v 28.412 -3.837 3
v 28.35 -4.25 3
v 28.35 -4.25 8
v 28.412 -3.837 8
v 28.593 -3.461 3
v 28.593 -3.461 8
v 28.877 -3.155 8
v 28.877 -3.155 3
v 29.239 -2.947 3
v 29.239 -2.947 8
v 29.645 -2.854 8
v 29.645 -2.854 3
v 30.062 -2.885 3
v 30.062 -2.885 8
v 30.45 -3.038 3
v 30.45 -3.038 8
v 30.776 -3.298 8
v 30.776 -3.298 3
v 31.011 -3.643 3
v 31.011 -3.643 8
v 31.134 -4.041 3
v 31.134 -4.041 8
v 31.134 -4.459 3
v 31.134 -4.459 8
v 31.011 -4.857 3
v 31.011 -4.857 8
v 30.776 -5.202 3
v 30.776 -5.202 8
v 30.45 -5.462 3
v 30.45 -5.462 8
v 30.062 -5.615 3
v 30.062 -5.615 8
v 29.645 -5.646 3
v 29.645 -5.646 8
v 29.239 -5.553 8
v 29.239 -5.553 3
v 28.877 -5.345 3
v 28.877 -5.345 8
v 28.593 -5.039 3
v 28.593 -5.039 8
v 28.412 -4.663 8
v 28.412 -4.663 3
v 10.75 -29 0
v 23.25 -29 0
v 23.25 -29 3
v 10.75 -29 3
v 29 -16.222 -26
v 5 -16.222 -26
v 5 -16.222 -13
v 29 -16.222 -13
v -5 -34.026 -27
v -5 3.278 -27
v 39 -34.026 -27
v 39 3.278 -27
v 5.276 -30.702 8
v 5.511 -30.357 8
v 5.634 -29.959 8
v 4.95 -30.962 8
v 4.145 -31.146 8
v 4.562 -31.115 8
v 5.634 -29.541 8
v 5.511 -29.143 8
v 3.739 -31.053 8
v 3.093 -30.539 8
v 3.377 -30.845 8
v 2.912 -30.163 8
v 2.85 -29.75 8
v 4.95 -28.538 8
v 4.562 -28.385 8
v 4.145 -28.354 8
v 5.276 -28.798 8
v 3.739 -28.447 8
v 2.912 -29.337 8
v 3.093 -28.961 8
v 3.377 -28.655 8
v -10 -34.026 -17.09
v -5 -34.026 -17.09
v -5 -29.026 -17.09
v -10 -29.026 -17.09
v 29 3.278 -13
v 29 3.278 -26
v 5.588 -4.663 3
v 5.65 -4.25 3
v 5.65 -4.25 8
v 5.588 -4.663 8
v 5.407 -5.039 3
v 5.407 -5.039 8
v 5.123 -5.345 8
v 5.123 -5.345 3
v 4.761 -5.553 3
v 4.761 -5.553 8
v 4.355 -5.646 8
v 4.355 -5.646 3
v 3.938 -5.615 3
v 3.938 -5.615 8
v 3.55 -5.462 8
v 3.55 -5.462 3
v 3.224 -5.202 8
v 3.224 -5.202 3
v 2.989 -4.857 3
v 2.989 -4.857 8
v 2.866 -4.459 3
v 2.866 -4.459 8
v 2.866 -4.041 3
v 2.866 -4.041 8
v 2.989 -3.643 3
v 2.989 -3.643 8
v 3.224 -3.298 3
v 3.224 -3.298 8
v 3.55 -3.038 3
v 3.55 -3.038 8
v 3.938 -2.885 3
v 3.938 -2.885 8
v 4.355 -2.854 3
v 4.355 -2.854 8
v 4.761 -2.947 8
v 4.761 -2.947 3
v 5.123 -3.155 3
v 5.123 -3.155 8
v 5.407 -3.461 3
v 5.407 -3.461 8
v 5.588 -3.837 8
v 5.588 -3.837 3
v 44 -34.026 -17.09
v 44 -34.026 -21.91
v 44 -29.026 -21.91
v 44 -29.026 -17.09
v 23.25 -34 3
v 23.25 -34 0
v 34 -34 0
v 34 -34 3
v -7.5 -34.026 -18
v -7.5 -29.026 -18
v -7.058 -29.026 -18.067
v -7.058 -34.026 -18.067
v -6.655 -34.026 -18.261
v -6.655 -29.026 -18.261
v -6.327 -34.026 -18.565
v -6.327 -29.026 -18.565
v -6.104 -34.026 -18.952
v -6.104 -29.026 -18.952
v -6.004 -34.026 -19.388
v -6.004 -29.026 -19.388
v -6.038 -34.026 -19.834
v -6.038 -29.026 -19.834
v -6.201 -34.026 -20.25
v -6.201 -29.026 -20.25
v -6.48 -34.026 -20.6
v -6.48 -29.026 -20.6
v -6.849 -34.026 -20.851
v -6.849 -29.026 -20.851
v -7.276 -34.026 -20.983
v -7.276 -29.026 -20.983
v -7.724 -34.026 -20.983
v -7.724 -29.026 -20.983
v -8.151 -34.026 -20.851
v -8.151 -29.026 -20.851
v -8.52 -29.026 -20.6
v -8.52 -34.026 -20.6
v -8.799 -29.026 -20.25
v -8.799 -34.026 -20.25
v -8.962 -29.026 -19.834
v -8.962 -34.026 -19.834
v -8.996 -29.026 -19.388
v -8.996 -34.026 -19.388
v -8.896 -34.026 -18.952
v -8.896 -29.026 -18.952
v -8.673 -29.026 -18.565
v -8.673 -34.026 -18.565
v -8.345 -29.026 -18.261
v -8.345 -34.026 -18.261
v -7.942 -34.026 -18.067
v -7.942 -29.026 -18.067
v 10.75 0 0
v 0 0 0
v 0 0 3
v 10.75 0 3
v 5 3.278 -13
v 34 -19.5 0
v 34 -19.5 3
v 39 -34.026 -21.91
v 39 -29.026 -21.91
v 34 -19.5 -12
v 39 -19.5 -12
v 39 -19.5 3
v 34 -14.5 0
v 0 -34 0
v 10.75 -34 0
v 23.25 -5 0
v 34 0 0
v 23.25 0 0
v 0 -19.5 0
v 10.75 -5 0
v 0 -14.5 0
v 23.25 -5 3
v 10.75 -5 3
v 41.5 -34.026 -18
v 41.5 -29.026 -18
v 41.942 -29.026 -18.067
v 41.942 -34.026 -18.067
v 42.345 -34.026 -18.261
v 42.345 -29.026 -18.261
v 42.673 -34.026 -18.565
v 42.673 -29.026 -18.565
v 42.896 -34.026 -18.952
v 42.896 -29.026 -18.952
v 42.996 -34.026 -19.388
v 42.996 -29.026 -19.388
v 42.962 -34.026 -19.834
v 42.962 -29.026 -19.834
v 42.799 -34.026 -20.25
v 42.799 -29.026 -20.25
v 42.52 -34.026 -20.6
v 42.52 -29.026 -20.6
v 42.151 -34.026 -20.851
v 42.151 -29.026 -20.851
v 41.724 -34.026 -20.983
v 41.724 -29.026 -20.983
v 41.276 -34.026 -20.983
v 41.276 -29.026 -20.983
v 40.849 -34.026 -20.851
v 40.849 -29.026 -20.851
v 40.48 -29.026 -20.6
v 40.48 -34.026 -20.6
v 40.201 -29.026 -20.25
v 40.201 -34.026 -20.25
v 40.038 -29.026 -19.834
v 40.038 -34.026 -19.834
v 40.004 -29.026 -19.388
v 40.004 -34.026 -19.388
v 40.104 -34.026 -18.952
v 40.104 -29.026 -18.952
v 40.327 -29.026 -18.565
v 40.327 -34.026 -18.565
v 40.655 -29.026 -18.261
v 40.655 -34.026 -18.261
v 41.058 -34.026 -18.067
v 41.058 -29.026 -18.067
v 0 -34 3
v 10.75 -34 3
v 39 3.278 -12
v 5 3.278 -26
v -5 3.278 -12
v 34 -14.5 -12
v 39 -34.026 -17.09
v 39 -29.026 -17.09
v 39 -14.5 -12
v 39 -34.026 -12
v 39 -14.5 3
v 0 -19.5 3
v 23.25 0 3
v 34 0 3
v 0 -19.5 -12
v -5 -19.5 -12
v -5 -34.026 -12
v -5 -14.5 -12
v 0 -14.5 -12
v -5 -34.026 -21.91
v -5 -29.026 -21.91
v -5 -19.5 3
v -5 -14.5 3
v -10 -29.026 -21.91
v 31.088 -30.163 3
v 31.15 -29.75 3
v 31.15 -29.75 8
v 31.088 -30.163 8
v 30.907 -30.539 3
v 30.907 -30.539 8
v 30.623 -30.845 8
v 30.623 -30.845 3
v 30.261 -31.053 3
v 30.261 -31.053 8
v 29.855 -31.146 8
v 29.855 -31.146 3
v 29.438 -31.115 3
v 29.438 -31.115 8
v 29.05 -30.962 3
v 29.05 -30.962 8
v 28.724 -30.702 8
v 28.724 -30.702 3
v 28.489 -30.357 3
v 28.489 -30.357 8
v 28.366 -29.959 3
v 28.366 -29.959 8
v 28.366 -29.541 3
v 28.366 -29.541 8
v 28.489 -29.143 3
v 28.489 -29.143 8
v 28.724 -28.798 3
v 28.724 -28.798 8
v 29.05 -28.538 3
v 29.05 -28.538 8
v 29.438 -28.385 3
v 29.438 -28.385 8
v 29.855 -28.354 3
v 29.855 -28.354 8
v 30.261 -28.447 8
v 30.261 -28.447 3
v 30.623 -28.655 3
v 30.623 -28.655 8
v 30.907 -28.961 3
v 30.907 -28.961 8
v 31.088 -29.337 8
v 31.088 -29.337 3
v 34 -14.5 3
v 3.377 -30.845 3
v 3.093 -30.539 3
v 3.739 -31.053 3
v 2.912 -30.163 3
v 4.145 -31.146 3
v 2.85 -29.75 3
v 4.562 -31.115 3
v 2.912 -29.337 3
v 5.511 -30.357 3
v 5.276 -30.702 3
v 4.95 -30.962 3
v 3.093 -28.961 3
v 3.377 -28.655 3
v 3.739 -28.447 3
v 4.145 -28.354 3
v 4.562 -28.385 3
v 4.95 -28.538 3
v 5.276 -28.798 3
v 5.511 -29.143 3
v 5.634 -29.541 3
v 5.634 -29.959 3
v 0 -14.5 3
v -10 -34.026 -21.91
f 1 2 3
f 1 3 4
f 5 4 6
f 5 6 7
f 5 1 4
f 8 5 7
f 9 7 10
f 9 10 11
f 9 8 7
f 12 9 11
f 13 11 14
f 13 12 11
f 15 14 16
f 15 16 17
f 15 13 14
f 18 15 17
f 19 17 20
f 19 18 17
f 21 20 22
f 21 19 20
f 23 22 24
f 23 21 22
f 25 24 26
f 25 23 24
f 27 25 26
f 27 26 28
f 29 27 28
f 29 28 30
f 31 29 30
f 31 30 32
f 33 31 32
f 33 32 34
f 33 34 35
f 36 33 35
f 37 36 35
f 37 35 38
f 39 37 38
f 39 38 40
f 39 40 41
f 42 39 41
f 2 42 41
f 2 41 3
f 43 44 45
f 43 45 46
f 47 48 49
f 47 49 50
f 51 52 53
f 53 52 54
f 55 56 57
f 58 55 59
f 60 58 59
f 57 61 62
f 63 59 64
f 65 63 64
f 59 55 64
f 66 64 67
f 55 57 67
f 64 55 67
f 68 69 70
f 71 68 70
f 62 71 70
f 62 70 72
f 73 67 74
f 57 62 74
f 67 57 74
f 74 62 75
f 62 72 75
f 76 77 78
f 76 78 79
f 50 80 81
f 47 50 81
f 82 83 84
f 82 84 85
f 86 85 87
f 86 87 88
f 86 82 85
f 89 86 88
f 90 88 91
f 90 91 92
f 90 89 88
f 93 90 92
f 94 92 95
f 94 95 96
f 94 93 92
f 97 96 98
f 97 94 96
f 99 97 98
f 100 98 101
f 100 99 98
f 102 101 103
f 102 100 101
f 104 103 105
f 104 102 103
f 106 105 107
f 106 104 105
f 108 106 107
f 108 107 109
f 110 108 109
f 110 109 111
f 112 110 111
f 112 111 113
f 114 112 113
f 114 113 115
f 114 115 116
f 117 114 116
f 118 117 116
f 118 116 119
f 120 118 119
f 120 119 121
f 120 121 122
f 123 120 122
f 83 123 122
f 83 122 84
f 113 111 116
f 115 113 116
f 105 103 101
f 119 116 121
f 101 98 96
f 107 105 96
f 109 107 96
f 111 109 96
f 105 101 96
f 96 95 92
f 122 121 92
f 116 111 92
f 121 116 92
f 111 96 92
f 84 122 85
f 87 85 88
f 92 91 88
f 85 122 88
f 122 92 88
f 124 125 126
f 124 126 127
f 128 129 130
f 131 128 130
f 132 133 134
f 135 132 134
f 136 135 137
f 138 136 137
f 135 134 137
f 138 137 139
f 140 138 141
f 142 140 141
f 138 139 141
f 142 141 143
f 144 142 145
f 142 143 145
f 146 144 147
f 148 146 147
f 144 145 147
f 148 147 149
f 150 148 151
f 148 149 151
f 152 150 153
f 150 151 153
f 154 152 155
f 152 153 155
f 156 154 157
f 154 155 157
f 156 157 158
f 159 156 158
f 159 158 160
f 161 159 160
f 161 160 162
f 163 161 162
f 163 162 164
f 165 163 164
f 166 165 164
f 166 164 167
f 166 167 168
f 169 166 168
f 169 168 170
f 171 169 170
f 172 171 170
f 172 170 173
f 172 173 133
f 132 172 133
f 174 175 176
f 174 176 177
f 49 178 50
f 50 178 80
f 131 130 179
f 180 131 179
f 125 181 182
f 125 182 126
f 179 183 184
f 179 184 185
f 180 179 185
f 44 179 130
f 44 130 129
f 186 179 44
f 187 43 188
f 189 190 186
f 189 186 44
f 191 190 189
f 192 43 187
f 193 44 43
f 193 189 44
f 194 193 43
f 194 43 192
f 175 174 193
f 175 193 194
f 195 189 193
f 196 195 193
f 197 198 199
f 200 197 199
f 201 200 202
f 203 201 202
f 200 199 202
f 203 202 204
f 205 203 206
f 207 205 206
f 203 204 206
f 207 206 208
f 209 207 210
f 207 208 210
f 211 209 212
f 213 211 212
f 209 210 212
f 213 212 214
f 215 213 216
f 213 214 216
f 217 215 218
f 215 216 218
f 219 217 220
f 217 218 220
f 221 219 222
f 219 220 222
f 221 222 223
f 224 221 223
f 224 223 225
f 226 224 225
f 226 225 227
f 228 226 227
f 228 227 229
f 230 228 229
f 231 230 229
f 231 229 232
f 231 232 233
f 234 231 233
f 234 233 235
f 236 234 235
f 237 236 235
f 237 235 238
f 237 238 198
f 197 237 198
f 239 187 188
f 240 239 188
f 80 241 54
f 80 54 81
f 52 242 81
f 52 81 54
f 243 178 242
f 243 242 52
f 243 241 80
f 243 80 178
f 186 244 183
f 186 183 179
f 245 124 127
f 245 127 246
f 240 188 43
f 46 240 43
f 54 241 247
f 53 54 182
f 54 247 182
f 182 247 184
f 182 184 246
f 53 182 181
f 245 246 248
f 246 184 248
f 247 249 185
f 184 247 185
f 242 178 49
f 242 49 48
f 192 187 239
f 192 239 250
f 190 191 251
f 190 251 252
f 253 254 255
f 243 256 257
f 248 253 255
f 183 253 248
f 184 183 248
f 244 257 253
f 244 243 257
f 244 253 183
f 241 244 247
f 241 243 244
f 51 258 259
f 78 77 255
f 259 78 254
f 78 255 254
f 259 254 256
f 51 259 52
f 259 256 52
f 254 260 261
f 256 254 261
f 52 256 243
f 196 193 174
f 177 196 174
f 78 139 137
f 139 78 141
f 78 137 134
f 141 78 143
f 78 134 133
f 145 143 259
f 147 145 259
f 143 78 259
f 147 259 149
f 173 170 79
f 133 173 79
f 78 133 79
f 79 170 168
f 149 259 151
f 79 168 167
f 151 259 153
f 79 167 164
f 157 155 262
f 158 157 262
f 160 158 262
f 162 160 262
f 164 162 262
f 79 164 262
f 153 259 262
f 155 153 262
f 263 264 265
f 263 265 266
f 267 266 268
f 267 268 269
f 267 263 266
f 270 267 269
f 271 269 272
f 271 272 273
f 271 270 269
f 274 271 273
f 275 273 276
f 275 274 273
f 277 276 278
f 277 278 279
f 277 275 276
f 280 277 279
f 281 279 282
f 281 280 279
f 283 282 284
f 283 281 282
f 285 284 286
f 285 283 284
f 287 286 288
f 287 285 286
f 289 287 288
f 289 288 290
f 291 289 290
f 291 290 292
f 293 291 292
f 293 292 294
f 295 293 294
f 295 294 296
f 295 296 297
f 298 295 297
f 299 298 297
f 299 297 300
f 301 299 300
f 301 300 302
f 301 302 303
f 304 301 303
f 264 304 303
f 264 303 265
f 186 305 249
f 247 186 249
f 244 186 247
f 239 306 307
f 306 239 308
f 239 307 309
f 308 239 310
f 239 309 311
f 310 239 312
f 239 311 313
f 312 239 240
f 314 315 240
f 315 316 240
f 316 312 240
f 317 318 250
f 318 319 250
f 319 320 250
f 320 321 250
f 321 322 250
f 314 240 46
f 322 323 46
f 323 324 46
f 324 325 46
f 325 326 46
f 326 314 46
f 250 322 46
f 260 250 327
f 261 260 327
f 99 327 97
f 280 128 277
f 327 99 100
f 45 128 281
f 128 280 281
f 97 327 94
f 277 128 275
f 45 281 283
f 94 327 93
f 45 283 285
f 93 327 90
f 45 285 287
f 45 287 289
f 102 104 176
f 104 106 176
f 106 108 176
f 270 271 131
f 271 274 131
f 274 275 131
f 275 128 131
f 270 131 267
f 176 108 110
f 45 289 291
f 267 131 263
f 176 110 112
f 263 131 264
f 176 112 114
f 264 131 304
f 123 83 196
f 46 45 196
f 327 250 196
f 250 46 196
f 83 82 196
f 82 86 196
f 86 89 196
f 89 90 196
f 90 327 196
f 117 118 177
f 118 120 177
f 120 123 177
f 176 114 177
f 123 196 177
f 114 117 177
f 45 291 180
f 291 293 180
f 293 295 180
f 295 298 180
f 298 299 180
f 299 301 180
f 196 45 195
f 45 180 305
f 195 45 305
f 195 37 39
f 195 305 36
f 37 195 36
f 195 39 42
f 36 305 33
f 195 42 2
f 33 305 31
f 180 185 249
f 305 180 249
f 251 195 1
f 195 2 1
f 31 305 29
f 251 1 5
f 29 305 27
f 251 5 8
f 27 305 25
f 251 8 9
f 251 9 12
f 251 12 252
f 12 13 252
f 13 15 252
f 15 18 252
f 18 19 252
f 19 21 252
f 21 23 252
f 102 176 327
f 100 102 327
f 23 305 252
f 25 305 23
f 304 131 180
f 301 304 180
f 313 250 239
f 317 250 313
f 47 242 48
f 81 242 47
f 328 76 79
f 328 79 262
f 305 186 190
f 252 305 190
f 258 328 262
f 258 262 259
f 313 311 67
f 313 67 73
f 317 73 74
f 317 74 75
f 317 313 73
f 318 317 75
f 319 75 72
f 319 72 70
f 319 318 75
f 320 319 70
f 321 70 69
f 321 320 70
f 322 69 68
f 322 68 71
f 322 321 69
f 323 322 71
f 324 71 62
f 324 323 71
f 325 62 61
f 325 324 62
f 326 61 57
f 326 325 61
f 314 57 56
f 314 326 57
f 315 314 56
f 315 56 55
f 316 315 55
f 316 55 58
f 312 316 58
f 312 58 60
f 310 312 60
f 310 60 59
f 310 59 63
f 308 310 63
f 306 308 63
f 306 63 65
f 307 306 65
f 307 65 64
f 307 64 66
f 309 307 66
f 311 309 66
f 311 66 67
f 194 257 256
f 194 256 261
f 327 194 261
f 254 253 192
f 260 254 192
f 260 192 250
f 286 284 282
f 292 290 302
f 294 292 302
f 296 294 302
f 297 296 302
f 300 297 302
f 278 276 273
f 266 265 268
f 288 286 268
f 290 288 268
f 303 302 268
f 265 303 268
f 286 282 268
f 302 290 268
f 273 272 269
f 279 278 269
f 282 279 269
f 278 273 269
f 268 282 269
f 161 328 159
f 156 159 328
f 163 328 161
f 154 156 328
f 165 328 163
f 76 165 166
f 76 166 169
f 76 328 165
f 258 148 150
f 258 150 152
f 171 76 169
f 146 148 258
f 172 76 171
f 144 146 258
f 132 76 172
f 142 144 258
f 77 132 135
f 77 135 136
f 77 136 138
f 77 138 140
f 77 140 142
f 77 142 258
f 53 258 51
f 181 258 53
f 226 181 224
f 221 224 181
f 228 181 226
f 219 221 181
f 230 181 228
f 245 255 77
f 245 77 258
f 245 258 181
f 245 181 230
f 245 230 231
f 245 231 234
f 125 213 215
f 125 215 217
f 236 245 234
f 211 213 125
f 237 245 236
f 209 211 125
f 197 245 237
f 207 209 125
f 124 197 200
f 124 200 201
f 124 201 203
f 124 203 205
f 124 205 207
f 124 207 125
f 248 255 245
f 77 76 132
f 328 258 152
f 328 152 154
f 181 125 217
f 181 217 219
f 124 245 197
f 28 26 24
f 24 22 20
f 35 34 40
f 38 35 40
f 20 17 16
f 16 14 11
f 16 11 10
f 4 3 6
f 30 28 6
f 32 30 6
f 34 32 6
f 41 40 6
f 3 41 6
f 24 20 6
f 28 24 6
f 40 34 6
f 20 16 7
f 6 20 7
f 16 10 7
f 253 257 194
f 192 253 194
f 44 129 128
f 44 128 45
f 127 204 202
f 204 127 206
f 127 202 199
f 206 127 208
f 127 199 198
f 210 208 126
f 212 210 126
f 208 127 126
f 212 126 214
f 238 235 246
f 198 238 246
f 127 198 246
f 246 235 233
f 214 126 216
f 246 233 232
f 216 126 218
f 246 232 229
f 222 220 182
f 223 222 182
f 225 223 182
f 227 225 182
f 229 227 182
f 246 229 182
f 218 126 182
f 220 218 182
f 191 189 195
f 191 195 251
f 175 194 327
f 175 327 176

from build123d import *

# Parameters (mm, degrees)
SKETCH1_W           = 34
SKETCH1_H           = 34
BOSS_EXTRUDE1_DEPTH = 3
SKETCH2_W           = 12.5
SKETCH2_H           = 5
CUT_EXTRUDE1_DEPTH  = 49.176757882
BOSS_EXTRUDE2_DEPTH = 5
SKETCH3_R           = 1.4
BOSS_EXTRUDE3_DEPTH = 8
SKETCH33_W          = 15
SKETCH33_H          = 5
BOSS_EXTRUDE4_DEPTH = 5
BOSS_EXTRUDE6_DEPTH = 15
SKETCH36_W          = 24
SKETCH36_H          = 13
CUT_EXTRUDE2_DEPTH  = 19.5
BOSS_EXTRUDE7_DEPTH = 5
SKETCH39_R          = 1.5
CUT_EXTRUDE3_DEPTH  = 61.897668661


with BuildPart() as part:
    # Sketch1 → Boss-Extrude1 (new body)
    with BuildSketch(Plane.XY):
        with Locations((17, -17)):
            Rectangle(SKETCH1_W, SKETCH1_H)
    extrude(amount=BOSS_EXTRUDE1_DEPTH)

    # Sketch2 → Cut-Extrude1 (cut, through all)
    with BuildSketch(Plane(origin=(0, 0, 0), x_dir=(-1, 0, 0), z_dir=(0, 0, -1))):
        with Locations((-17, -2.5)):
            Rectangle(SKETCH2_W, SKETCH2_H)
        with Locations((-17, -31.5)):
            Rectangle(SKETCH2_W, SKETCH2_H)
    extrude(amount=-CUT_EXTRUDE1_DEPTH, mode=Mode.SUBTRACT)

    # Sketch25 → Boss-Extrude2 (add)
    with BuildSketch(Plane(origin=(34, 0, 0), x_dir=(0, 0, -1), z_dir=(1, 0, 0))):
        Polygon((-3, -17), (-3, -14.5), (12, -14.5), (12, -19.5), (-3, -19.5), align=None)
    extrude(amount=BOSS_EXTRUDE2_DEPTH)

    # Sketch3 → Boss-Extrude3 (add)
    with BuildSketch(Plane(origin=(0, 0, 0), x_dir=(-1, 0, 0), z_dir=(0, 0, -1))):
        with Locations((-29.75, -4.25)):
            Circle(SKETCH3_R)
        with Locations(Location((-4.25, -4.25, 0), (0, 0, 180))):
            Circle(SKETCH3_R)
        with Locations((-4.25, -29.75)):
            Circle(SKETCH3_R)
        with Locations(Location((-29.75, -29.75, 0), (0, 0, 180))):
            Circle(SKETCH3_R)
    extrude(amount=-BOSS_EXTRUDE3_DEPTH)

    # Sketch33 → Boss-Extrude4 (add)
    with BuildSketch(Plane.ZY):
        with Locations((-4.5, -17)):
            Rectangle(SKETCH33_W, SKETCH33_H)
    extrude(amount=BOSS_EXTRUDE4_DEPTH)

    # Sketch35 → Boss-Extrude6 (add)
    with BuildSketch(Plane(origin=(0, 0, -12), x_dir=(-1, 0, 0), z_dir=(0, 0, -1))):
        Polygon((-39, -17), (-39, 3.277699473), (5, 3.277699473), (5, -17), (5, -34.025954319), (-39, -34.025954319), align=None)
    extrude(amount=BOSS_EXTRUDE6_DEPTH)

    # Sketch36 → Cut-Extrude2 (cut)
    with BuildSketch(Plane(origin=(0, 3.277699473, 0), x_dir=(1, 0, 0), z_dir=(0, 1, 0))):
        with Locations((17, 19.5)):
            Rectangle(SKETCH36_W, SKETCH36_H)
    extrude(amount=-CUT_EXTRUDE2_DEPTH, mode=Mode.SUBTRACT)

    # Sketch38 → Boss-Extrude7 (add)
    with BuildSketch(Plane(origin=(0, -34.025954319, 0), x_dir=(-1, 0, 0), z_dir=(0, -1, 0))):
        Polygon((10, 21.910063987), (5, 21.910063987), (5, 17.089936013), (10, 17.089936013), (10, 19.410063987), (10, 19.589936013), align=None)
        Polygon((-39, 17.089936013), (-39, 21.910063987), (-44, 21.910063987), (-44, 19.589936013), (-44, 19.410063987), (-44, 17.089936013), align=None)
    extrude(amount=-BOSS_EXTRUDE7_DEPTH)

    # Sketch39 → Cut-Extrude3 (cut, through all)
    with BuildSketch(Plane(origin=(0, -29.025954319, 0), x_dir=(1, 0, 0), z_dir=(0, 1, 0))):
        with Locations(Location((-7.5, 19.5, 0), (0, 0, 270))):
            Circle(SKETCH39_R)
        with Locations(Location((41.5, 19.5, 0), (0, 0, 270))):
            Circle(SKETCH39_R)
    extrude(amount=-CUT_EXTRUDE3_DEPTH, mode=Mode.SUBTRACT)


solid = part.part
